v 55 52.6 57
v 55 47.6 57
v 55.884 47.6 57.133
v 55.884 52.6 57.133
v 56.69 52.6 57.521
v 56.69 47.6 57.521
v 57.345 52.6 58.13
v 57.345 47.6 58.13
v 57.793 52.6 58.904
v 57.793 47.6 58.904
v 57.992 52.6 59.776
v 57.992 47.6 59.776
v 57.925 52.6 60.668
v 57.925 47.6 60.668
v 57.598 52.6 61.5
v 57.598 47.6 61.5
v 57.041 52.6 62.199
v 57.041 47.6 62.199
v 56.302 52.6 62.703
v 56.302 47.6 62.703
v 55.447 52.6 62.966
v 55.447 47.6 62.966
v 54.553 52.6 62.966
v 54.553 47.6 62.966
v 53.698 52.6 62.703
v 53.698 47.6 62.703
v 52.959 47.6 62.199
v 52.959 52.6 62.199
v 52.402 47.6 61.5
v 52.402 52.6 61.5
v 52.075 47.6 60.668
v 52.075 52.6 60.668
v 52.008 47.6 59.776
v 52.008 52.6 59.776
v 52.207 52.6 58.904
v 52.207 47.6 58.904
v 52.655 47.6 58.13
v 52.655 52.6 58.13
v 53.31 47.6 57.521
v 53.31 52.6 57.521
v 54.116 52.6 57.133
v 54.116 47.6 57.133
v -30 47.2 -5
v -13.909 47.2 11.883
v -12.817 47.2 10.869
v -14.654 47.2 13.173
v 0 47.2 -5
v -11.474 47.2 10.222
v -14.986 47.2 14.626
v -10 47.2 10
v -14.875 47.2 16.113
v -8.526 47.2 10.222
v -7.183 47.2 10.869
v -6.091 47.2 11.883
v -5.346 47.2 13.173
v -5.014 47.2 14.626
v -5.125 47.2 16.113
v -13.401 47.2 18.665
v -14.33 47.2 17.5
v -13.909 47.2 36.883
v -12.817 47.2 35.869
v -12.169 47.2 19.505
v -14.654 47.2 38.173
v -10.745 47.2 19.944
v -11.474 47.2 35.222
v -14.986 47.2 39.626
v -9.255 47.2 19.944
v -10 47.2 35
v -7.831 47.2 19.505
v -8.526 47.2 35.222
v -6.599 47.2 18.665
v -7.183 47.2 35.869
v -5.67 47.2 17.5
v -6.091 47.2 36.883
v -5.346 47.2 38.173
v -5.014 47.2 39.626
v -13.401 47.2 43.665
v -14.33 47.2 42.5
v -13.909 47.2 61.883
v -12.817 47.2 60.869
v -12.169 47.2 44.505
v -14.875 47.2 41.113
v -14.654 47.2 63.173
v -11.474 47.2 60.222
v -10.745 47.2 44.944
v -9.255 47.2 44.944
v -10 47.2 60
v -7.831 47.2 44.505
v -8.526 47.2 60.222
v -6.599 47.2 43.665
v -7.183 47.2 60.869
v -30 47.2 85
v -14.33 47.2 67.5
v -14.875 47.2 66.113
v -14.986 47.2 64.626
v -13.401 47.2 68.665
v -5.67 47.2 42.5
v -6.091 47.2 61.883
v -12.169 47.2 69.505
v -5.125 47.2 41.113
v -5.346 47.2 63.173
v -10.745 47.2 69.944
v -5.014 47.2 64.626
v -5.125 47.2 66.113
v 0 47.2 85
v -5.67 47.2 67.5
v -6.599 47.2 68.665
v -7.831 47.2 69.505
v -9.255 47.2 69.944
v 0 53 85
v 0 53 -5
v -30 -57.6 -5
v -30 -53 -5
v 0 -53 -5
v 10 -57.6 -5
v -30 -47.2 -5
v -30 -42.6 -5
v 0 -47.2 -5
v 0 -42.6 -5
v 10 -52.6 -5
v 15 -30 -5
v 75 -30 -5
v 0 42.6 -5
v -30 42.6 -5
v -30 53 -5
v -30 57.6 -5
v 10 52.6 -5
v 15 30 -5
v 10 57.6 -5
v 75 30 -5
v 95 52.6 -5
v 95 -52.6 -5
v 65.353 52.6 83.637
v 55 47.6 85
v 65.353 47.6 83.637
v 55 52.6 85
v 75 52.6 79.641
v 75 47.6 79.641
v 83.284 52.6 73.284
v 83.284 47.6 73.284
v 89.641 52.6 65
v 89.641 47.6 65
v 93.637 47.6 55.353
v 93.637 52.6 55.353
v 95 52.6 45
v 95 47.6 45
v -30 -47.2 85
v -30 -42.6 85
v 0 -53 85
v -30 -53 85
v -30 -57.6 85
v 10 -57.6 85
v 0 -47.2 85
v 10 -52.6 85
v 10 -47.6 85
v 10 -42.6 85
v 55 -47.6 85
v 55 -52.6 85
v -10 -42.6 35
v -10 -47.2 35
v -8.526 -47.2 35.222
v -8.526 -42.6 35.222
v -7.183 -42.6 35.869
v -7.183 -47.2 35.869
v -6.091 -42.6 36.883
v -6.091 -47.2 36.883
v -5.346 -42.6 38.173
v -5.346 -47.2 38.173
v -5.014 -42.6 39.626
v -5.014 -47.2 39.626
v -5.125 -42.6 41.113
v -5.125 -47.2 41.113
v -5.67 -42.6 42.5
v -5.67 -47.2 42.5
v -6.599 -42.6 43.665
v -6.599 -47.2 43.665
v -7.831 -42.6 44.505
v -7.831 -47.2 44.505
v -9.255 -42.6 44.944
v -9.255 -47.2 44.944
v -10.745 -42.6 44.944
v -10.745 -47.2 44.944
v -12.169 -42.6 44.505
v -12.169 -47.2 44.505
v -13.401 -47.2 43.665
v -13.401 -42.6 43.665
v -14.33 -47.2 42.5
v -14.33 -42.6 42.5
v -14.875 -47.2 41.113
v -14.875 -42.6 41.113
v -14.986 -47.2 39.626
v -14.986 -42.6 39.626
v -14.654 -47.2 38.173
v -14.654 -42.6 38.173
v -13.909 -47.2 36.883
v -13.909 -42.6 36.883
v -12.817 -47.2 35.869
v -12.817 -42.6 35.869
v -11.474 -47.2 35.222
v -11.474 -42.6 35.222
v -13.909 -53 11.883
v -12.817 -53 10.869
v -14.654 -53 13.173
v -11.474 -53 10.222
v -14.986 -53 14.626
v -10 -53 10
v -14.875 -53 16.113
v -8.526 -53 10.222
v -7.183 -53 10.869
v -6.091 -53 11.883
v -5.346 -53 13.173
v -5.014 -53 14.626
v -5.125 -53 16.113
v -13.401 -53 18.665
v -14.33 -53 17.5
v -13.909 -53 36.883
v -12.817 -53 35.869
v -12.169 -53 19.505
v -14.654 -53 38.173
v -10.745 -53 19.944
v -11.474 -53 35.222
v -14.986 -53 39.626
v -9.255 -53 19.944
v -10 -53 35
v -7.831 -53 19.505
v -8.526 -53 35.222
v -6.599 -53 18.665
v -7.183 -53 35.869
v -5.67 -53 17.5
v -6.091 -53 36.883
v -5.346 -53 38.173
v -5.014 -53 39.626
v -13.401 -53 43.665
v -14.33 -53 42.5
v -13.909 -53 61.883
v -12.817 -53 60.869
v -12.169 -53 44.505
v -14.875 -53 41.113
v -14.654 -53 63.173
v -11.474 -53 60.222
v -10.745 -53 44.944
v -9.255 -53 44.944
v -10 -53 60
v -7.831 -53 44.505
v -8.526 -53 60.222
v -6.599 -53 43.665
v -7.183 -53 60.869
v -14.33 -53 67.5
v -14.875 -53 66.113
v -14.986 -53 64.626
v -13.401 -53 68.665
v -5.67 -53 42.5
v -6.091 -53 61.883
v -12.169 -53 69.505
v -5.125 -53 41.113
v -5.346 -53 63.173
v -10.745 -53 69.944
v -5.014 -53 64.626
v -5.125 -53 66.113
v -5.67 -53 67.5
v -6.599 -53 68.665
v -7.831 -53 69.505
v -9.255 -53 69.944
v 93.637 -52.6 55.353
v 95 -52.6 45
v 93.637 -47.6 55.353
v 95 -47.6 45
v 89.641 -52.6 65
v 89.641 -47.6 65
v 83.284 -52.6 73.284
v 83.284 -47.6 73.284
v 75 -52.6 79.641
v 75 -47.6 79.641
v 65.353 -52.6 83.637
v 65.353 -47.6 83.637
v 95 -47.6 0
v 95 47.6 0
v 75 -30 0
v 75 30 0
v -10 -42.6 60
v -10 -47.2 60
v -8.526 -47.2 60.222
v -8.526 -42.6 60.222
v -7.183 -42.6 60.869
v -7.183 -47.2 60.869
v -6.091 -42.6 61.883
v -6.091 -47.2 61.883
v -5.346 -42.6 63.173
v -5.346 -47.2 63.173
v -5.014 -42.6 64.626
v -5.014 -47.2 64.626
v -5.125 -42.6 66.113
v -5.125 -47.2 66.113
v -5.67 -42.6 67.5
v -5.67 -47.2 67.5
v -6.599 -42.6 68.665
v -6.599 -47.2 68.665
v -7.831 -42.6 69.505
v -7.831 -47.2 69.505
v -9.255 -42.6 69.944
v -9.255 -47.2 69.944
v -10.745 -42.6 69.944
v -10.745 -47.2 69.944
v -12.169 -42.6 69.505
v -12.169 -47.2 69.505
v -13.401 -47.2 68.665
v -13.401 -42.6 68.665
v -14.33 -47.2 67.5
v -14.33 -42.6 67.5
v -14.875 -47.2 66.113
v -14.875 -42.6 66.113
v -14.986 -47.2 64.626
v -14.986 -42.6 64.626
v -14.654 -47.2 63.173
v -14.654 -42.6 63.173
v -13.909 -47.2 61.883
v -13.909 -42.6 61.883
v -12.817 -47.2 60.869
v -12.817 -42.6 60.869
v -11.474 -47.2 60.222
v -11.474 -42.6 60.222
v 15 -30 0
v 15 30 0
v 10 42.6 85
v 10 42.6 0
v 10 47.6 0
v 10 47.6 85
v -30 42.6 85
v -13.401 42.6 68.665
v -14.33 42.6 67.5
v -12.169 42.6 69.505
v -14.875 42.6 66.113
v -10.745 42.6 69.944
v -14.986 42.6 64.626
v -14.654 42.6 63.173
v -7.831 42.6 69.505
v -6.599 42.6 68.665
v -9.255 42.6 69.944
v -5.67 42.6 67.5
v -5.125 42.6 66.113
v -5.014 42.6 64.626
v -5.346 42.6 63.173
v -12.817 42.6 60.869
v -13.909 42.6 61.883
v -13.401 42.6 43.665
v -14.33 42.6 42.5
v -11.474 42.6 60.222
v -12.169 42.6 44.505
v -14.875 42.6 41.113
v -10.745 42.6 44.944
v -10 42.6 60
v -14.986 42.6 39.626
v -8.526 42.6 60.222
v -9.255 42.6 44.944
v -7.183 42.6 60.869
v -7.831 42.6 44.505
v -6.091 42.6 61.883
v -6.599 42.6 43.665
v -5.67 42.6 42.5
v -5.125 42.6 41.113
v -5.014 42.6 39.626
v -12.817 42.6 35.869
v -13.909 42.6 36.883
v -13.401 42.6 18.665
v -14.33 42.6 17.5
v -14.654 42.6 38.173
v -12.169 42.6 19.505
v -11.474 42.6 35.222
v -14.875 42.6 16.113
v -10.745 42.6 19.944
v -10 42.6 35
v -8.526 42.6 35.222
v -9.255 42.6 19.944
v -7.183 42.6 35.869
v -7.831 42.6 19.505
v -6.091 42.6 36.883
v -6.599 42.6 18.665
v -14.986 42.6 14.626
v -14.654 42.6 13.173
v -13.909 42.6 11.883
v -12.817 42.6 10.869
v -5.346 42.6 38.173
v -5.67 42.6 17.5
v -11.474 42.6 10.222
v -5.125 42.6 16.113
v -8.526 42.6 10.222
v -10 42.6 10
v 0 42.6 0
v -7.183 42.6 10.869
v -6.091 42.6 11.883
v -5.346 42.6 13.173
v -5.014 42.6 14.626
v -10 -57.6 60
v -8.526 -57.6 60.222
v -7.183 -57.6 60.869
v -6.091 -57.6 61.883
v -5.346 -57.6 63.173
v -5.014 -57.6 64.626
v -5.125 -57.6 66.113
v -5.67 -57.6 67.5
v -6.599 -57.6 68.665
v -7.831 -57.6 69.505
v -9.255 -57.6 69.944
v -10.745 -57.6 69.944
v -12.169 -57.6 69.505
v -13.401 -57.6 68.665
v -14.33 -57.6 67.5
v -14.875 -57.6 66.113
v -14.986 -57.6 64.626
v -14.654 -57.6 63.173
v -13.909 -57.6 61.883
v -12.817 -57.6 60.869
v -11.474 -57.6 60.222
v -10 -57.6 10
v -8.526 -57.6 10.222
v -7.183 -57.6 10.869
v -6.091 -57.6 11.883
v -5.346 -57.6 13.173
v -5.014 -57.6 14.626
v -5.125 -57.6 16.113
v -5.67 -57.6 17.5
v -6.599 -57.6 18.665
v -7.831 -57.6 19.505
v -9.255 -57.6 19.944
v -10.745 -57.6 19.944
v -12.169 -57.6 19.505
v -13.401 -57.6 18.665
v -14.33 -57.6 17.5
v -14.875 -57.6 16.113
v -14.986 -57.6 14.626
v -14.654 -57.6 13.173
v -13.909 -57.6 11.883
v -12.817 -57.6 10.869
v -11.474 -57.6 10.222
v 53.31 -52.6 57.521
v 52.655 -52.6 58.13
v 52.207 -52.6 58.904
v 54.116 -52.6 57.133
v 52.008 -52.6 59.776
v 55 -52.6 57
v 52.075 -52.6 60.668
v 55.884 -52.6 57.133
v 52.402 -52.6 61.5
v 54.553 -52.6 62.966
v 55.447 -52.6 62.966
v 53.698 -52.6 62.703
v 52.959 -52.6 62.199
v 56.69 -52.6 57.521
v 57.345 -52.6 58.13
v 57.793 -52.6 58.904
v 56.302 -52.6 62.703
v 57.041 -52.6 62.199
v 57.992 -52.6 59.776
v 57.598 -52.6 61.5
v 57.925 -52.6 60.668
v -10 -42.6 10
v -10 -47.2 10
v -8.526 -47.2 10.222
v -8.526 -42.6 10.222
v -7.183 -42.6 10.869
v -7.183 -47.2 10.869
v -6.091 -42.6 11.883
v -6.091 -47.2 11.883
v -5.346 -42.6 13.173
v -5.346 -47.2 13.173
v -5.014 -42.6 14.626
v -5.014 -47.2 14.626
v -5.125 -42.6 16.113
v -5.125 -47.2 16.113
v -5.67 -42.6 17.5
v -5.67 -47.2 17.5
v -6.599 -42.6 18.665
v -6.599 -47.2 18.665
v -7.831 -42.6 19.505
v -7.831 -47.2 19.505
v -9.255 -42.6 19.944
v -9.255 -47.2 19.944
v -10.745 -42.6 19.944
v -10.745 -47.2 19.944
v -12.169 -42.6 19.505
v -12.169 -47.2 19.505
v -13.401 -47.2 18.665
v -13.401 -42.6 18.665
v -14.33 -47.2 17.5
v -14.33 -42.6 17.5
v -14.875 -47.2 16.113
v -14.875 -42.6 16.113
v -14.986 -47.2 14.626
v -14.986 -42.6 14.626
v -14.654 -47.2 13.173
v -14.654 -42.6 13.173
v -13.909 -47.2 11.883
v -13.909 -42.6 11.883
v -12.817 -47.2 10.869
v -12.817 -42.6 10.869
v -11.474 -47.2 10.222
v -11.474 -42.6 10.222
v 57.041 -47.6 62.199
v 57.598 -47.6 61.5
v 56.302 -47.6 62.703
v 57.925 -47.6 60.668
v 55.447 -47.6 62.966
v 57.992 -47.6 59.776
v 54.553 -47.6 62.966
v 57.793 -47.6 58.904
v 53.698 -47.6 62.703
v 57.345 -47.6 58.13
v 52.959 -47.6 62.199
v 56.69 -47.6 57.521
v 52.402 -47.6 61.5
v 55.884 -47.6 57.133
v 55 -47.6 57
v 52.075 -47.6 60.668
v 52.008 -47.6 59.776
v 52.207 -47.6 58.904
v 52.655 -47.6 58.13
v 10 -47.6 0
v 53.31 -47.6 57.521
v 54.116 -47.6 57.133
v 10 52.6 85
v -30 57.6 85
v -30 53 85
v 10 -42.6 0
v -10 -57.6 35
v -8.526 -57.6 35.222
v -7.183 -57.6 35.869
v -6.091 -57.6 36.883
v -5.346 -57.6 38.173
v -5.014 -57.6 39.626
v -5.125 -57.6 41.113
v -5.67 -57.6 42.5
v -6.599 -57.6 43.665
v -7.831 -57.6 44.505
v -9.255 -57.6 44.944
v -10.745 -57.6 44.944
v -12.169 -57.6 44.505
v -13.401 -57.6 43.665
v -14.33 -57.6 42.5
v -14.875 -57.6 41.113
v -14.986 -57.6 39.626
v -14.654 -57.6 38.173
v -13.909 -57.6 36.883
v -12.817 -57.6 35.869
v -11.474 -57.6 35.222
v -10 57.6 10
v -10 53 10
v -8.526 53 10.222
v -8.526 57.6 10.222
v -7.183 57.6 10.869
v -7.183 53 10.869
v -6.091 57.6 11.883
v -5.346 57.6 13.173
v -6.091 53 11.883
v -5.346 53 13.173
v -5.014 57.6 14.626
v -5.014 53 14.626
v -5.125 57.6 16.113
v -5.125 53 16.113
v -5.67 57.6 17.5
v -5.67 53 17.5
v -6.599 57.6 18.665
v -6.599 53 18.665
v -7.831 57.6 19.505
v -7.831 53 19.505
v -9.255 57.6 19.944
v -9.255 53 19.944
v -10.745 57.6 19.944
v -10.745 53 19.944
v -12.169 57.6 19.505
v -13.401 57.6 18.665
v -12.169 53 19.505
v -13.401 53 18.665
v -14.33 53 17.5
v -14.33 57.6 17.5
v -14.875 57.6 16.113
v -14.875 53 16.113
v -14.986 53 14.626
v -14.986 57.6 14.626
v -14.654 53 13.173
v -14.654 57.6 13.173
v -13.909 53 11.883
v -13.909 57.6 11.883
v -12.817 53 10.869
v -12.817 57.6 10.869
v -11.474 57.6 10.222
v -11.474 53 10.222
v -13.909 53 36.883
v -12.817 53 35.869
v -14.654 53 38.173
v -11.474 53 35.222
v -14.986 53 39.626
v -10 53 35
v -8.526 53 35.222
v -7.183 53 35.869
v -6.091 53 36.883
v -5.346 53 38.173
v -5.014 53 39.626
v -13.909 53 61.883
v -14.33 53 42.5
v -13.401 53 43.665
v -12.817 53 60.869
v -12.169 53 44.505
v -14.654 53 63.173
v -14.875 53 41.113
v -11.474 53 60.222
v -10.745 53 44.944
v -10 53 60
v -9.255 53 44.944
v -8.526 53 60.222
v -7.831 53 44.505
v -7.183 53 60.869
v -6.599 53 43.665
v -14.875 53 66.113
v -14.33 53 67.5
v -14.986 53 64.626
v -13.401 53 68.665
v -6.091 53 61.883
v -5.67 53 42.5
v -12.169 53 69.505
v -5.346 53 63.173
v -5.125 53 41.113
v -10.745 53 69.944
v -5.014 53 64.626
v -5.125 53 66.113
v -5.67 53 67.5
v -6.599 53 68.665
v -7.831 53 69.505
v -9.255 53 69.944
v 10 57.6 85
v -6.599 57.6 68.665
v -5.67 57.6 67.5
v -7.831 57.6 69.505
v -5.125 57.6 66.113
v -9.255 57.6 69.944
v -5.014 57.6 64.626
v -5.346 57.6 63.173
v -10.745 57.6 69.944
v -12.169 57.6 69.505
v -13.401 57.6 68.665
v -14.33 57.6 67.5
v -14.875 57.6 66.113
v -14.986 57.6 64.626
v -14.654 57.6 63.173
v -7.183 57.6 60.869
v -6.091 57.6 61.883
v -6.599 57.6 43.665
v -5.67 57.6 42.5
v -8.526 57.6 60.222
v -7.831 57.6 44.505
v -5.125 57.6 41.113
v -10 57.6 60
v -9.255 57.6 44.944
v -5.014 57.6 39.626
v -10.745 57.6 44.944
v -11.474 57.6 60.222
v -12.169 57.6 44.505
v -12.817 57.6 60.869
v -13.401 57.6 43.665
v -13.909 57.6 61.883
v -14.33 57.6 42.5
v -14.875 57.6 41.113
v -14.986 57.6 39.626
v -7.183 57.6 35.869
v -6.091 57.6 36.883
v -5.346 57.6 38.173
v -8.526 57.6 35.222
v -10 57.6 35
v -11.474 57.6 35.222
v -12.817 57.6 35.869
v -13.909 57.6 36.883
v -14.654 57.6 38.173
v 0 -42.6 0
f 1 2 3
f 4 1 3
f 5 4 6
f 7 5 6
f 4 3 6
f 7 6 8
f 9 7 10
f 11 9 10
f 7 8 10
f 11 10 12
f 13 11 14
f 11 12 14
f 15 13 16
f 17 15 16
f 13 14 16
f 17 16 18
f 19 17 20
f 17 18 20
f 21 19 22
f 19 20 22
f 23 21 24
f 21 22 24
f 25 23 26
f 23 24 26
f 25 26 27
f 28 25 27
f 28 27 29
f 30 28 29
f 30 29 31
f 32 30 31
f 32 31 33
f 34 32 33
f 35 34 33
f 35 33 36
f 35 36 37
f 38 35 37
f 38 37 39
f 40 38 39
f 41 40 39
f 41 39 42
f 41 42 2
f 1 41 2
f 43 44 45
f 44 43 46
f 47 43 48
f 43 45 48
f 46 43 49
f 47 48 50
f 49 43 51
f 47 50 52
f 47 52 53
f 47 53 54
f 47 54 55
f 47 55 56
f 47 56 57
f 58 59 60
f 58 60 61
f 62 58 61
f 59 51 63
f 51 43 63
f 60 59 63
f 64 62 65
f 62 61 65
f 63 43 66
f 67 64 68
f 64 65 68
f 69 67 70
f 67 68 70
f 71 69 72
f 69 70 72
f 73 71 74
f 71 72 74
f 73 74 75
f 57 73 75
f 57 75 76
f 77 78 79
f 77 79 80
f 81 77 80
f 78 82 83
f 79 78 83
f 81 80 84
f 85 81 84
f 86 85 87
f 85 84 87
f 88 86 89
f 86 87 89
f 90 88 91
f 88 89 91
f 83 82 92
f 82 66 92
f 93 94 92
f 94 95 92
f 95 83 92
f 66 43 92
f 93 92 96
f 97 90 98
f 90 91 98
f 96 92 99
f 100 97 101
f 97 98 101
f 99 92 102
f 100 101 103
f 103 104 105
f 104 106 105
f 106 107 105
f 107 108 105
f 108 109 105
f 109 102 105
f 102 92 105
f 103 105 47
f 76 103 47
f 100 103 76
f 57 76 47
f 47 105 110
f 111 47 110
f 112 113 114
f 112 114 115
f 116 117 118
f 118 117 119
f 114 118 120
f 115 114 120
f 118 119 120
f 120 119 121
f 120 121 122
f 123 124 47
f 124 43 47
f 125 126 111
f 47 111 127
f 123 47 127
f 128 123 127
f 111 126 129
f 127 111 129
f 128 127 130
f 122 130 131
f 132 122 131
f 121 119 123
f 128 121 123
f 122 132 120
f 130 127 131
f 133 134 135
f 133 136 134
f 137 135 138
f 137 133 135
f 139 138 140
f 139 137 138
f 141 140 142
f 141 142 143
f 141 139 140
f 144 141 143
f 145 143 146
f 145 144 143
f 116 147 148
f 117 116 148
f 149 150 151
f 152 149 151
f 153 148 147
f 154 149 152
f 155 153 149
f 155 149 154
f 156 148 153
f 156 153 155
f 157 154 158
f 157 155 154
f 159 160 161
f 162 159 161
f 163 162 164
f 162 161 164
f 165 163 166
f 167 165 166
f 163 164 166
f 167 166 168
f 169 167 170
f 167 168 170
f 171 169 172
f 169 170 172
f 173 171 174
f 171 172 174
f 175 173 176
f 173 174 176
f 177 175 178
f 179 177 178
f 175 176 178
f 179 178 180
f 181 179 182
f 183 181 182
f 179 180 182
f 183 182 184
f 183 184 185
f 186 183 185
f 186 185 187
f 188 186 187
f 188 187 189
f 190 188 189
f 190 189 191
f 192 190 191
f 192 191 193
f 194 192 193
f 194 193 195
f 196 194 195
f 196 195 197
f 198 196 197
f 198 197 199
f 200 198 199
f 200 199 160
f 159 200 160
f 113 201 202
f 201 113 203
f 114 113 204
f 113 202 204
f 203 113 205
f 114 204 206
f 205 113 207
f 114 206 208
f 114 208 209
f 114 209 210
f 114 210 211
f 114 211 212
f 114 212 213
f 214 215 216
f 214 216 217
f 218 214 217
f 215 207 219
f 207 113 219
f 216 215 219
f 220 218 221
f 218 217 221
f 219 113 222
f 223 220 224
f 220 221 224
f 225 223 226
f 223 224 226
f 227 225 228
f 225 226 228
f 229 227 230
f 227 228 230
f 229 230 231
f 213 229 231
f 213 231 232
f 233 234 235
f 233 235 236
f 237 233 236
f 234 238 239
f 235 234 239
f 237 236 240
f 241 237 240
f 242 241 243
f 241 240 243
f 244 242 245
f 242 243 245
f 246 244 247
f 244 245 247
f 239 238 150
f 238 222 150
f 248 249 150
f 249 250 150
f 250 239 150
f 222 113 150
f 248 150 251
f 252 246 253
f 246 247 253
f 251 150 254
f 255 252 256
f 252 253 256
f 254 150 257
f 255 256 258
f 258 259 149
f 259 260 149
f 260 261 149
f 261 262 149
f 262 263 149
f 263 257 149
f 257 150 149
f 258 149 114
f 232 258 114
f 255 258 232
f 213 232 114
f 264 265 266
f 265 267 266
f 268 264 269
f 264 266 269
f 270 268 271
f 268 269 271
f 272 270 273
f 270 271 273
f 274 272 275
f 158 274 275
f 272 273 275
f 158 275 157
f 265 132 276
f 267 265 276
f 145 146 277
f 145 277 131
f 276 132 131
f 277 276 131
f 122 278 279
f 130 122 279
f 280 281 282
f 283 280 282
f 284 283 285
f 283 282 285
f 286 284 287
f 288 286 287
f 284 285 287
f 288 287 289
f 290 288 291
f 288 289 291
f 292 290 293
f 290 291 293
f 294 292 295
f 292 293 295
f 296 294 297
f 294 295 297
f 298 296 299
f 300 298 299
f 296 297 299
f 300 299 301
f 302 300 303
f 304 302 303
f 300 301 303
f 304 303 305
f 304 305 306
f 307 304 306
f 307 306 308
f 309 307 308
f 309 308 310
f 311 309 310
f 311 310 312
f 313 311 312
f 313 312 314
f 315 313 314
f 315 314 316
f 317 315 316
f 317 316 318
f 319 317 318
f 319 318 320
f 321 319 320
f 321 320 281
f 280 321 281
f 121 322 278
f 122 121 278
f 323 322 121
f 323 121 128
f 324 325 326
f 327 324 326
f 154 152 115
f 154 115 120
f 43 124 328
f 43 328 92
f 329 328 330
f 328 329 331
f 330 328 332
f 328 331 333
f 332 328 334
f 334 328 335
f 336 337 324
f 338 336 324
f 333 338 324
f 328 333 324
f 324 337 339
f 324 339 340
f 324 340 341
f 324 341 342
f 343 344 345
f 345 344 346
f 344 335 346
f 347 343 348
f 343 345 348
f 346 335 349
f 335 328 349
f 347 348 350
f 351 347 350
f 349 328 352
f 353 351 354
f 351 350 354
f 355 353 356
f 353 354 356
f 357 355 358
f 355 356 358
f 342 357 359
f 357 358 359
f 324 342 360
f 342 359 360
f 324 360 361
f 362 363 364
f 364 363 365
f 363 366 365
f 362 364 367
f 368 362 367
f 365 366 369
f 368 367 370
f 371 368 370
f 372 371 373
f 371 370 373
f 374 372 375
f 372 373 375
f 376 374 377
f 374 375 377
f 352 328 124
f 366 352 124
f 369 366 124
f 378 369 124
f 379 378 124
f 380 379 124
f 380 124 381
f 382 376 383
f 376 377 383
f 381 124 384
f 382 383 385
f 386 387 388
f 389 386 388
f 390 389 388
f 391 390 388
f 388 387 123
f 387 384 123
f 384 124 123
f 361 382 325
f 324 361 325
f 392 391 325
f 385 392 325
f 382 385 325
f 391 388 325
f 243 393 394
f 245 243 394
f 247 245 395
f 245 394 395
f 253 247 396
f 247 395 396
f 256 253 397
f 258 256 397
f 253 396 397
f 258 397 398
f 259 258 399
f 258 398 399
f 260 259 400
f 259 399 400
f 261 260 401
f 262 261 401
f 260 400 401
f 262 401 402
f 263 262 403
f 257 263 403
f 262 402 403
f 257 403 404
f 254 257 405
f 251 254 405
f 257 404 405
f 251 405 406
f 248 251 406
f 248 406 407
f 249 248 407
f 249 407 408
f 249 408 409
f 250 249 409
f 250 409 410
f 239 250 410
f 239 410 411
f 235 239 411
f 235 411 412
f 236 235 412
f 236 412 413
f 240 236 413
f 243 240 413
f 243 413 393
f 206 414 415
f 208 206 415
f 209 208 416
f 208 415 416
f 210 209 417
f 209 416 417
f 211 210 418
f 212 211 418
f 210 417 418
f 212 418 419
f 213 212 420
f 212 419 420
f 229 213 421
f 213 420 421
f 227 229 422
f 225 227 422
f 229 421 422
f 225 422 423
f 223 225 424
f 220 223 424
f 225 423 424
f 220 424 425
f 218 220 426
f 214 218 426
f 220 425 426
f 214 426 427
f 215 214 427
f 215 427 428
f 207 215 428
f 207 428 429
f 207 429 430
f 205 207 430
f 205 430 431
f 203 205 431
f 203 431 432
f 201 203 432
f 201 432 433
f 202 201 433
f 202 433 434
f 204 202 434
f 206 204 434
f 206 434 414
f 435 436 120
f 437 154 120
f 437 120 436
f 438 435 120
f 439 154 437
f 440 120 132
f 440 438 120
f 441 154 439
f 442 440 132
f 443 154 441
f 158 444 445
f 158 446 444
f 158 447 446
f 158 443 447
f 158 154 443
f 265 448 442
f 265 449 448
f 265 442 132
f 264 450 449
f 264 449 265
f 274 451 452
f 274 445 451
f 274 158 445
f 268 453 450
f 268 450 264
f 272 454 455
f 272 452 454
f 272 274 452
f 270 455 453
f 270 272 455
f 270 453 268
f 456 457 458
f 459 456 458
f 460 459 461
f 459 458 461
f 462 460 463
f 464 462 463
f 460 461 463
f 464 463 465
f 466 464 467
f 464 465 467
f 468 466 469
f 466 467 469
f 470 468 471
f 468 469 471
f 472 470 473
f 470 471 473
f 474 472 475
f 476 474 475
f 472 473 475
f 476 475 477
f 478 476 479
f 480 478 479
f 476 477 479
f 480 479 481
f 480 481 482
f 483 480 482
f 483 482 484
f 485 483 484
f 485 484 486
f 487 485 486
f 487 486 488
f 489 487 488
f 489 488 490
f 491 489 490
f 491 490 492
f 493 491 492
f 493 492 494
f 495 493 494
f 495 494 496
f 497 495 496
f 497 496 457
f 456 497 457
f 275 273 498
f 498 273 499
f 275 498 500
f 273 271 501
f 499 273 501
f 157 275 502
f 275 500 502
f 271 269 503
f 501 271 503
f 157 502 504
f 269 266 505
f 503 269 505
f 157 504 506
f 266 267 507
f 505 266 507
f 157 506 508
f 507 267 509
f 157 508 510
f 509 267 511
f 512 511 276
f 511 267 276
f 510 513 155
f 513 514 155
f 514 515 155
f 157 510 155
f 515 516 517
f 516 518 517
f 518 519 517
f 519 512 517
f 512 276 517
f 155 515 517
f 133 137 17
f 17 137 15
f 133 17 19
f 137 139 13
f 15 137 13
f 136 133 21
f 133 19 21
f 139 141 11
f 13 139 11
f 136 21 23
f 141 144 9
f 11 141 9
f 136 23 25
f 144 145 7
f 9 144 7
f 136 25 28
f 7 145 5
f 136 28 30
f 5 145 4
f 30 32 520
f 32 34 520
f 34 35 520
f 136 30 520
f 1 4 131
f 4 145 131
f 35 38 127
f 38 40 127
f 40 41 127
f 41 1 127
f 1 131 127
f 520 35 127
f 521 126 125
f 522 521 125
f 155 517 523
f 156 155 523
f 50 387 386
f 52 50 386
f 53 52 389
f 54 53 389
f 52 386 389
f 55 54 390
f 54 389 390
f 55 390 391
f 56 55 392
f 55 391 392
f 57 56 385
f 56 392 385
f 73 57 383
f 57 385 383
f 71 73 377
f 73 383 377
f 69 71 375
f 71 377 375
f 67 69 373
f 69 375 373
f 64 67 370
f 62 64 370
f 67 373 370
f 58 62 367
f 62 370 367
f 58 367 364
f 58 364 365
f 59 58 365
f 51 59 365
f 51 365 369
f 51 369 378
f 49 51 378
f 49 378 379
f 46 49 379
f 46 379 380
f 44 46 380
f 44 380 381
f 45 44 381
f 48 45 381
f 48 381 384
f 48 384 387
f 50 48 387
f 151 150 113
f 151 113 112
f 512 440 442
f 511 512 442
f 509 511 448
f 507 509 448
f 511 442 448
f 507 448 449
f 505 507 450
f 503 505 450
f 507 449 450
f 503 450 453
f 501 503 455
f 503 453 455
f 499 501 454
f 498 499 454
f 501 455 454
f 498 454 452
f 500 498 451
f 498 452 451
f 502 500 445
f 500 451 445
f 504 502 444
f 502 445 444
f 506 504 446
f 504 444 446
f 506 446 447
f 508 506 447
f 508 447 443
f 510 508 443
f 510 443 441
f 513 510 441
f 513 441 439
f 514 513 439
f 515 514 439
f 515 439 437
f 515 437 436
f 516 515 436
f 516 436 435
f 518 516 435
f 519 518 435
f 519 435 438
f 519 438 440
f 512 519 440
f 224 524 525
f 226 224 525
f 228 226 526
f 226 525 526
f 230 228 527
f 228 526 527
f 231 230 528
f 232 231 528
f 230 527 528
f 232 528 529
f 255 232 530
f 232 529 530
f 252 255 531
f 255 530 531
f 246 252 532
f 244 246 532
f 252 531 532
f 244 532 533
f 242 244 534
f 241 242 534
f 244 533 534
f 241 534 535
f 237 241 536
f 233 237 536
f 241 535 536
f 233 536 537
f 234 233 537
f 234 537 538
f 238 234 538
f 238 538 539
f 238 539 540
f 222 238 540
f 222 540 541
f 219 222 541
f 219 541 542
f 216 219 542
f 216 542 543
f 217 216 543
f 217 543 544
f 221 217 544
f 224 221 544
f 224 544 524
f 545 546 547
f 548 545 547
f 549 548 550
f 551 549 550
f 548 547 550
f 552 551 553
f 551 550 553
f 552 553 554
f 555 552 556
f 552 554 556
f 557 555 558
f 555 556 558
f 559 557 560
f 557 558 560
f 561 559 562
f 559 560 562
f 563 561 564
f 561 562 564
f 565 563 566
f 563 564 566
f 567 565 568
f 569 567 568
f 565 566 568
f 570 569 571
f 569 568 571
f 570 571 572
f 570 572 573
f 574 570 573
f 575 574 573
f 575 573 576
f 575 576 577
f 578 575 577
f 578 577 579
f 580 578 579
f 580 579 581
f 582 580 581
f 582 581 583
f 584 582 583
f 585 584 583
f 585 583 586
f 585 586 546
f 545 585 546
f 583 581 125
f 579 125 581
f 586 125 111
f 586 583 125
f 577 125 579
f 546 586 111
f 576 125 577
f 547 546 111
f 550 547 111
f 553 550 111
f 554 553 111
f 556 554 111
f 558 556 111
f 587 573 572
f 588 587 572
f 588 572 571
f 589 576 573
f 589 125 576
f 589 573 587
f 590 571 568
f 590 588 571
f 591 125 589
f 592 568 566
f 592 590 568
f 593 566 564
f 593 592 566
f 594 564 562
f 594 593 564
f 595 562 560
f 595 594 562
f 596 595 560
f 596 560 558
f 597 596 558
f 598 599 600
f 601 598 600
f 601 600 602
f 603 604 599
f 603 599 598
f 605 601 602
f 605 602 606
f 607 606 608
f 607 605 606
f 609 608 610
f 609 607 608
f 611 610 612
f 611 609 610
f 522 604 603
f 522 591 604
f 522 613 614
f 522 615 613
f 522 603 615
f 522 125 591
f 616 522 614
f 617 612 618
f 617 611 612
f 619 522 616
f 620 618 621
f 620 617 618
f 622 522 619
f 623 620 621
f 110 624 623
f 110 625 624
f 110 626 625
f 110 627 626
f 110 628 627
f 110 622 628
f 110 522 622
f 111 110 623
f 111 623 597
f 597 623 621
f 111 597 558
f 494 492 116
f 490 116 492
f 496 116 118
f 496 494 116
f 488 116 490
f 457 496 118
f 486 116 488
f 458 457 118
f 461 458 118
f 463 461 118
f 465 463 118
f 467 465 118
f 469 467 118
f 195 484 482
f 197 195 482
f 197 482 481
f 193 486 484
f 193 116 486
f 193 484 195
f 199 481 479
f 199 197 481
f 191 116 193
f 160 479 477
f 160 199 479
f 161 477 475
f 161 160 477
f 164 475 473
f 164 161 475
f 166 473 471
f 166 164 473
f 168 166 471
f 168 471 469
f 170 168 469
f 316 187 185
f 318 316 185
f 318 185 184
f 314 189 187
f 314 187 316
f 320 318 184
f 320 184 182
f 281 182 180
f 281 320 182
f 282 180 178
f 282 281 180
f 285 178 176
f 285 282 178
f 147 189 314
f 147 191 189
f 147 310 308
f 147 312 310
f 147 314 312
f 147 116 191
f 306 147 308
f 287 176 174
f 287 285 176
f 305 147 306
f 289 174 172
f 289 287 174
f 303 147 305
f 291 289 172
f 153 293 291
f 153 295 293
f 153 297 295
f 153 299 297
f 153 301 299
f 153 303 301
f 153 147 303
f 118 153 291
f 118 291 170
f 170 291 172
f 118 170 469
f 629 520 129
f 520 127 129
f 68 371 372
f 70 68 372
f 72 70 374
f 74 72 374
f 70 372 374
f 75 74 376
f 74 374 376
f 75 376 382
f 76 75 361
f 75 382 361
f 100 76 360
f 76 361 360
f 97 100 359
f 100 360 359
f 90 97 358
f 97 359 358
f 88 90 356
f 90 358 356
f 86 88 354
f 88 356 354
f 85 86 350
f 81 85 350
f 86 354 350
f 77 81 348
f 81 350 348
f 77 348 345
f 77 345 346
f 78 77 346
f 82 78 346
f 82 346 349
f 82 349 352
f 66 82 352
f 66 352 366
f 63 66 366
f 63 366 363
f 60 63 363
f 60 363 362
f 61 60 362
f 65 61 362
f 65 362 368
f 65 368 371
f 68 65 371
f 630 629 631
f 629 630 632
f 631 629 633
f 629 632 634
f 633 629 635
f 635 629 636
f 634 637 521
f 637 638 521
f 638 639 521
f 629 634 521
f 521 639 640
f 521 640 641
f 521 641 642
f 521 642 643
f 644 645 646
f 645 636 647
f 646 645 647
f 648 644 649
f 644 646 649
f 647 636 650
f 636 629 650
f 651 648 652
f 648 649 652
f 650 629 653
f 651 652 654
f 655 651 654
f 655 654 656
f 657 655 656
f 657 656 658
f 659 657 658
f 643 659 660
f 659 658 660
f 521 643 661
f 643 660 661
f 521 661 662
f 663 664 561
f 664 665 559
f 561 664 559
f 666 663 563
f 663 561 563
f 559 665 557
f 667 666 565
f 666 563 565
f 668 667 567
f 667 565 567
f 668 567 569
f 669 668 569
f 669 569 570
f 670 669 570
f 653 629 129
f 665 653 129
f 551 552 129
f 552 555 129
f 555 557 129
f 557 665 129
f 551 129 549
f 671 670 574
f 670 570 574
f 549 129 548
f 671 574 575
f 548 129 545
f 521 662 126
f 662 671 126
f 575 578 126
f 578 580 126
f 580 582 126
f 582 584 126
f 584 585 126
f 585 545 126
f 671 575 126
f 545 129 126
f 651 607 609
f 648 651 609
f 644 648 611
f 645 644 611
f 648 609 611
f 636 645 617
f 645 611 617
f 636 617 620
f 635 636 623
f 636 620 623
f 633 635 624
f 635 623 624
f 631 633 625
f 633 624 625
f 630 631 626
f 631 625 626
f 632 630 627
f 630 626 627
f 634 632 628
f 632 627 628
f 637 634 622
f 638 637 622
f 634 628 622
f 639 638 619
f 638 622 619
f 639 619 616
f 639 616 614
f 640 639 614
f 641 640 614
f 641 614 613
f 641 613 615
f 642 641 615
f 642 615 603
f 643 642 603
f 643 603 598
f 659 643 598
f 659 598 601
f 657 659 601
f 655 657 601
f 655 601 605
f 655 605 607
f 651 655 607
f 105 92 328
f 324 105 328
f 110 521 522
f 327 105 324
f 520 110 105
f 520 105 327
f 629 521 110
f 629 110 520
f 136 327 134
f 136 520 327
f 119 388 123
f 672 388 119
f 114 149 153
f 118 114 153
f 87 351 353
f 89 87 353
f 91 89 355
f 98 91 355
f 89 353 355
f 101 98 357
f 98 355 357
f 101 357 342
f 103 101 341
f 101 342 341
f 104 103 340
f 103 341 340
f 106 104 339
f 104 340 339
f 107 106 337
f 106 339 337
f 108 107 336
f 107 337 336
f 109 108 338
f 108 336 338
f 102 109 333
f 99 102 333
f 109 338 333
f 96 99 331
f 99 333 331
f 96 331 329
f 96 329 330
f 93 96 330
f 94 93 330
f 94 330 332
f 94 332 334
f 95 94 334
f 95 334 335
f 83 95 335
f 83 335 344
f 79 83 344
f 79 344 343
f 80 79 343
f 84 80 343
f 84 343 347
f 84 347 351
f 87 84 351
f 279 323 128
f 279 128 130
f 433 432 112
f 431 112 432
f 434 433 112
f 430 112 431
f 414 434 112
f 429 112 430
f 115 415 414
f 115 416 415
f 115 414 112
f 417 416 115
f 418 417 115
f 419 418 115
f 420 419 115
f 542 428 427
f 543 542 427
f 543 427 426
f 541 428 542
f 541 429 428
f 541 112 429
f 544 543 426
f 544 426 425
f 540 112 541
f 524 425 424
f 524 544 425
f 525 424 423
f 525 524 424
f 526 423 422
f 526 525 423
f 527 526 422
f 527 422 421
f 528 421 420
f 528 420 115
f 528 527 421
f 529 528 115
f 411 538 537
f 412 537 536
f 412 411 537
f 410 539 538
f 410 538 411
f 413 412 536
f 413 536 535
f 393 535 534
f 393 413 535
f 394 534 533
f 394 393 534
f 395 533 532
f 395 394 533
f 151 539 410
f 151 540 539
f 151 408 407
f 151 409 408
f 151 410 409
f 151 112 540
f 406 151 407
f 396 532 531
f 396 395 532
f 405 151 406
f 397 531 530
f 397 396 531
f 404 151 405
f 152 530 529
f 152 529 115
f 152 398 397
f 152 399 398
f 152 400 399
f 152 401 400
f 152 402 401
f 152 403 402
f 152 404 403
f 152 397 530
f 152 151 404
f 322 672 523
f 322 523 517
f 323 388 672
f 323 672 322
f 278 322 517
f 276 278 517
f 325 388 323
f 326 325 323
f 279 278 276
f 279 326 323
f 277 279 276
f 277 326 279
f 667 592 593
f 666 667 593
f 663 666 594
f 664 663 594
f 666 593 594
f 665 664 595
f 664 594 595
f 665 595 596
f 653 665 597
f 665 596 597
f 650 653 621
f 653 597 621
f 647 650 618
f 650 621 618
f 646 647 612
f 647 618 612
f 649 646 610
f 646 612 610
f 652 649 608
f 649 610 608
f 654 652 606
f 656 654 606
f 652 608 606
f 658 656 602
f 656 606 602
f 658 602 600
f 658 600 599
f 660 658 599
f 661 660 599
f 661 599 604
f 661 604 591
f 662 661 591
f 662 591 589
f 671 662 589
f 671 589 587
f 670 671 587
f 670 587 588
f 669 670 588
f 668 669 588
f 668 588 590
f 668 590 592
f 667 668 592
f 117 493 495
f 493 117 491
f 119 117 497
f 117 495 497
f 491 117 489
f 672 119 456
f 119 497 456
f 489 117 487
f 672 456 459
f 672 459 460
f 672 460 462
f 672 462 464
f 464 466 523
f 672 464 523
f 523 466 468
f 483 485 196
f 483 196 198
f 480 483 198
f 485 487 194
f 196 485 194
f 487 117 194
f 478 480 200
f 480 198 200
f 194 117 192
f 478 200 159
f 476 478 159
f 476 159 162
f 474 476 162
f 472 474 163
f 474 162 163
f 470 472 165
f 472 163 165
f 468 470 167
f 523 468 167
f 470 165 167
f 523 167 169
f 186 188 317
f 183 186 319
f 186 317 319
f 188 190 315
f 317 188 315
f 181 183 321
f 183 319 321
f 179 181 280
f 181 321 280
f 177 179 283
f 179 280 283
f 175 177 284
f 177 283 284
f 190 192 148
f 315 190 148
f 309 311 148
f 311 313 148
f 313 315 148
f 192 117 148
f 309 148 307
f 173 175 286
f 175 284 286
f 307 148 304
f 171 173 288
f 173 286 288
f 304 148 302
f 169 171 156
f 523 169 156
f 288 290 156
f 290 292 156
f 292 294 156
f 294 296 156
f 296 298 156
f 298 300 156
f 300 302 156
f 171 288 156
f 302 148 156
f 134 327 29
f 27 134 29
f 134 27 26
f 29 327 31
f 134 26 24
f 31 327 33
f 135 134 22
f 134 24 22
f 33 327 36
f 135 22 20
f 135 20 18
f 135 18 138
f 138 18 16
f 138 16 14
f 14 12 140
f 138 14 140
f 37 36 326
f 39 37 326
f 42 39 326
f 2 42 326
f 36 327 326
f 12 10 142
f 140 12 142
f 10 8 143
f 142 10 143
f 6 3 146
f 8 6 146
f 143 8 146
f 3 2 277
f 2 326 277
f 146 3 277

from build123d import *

# Parameters (mm, degrees)
EXTRUDE_1_DEPTH     = 5
EXTRUDE_2_DEPTH     = 85
SKETCH_2_R          = 3
CUT_EXTRUDE_1_DEPTH = 144
FILLET_1_R          = 40
SKETCH_4_W          = 30
SKETCH_4_H          = 5.8
CUT_EXTRUDE_2_DEPTH = 144
SKETCH_5_W          = 60
SKETCH_5_H          = 60
CUT_EXTRUDE_3_DEPTH = 144
SKETCH_6_R          = 5
CUT_EXTRUDE_4_DEPTH = 144


with BuildPart() as part:
    # 스케치1 → 보스-돌출1 (new body)
    with BuildSketch(Plane.XY):
        Polygon((0, -42.6), (-30, -42.6), (-30, -47.6), (0, -47.6), (0, -52.6), (-30, -52.6), (-30, -57.6), (10, -57.6), (10, -52.6), (95, -52.6), (95, 52.6), (10, 52.6), (10, 57.6), (-30, 57.6), (-30, 52.6), (0, 52.6), (0, 47.6), (-30, 47.6), (-30, 42.6), (0, 42.6), align=None)
    extrude(amount=-EXTRUDE_1_DEPTH)

    # 스케치1<3> → 보스-돌출2 (add)
    with BuildSketch(Plane.XY):
        Polygon((10, -47.6), (10, -42.6), (-30, -42.6), (-30, -47.6), (0, -47.6), (0, -52.6), (-30, -52.6), (-30, -57.6), (10, -57.6), (10, -52.6), (95, -52.6), (95, -47.6), align=None)
        Polygon((-30, 42.6), (10, 42.6), (10, 47.6), (95, 47.6), (95, 52.6), (10, 52.6), (10, 57.6), (-30, 57.6), (-30, 52.6), (0, 52.6), (0, 47.6), (-30, 47.6), align=None)
    extrude(amount=EXTRUDE_2_DEPTH)

    # 스케치2 → 컷-돌출1 (cut)
    with BuildSketch(Plane.XZ.offset(52.6)):
        with Locations((55, 60)):
            Circle(SKETCH_2_R)
    extrude(amount=-CUT_EXTRUDE_1_DEPTH, mode=Mode.SUBTRACT)

    # 필렛1
    fillet_1_edges = [part.edges().sort_by_distance(p)[0] for p in [
        (95, 50.1, 85),
        (95, -50.1, 85),
    ]]
    fillet(fillet_1_edges, radius=FILLET_1_R)

    # 스케치4 → 컷-돌출2 (cut)
    with BuildSketch(Plane.XY.offset(85)):
        with Locations((-15, -50.1)):
            Rectangle(SKETCH_4_W, SKETCH_4_H)
        with Locations((-15, 50.1)):
            Rectangle(SKETCH_4_W, SKETCH_4_H)
    extrude(amount=-CUT_EXTRUDE_2_DEPTH, mode=Mode.SUBTRACT)

    # 스케치5 → 컷-돌출3 (cut)
    with BuildSketch(Plane.XY):
        with Locations((45, 0)):
            Rectangle(SKETCH_5_W, SKETCH_5_H)
    extrude(amount=-CUT_EXTRUDE_3_DEPTH, mode=Mode.SUBTRACT)

    # 스케치6 → 컷-돌출4 (cut)
    with BuildSketch(Plane.XZ.offset(57.6)):
        with Locations((-10, 40)):
            Circle(SKETCH_6_R)
        with Locations((-10, 65)):
            Circle(SKETCH_6_R)
        with Locations((-10, 15)):
            Circle(SKETCH_6_R)
    extrude(amount=-CUT_EXTRUDE_4_DEPTH, mode=Mode.SUBTRACT)


solid = part.part
